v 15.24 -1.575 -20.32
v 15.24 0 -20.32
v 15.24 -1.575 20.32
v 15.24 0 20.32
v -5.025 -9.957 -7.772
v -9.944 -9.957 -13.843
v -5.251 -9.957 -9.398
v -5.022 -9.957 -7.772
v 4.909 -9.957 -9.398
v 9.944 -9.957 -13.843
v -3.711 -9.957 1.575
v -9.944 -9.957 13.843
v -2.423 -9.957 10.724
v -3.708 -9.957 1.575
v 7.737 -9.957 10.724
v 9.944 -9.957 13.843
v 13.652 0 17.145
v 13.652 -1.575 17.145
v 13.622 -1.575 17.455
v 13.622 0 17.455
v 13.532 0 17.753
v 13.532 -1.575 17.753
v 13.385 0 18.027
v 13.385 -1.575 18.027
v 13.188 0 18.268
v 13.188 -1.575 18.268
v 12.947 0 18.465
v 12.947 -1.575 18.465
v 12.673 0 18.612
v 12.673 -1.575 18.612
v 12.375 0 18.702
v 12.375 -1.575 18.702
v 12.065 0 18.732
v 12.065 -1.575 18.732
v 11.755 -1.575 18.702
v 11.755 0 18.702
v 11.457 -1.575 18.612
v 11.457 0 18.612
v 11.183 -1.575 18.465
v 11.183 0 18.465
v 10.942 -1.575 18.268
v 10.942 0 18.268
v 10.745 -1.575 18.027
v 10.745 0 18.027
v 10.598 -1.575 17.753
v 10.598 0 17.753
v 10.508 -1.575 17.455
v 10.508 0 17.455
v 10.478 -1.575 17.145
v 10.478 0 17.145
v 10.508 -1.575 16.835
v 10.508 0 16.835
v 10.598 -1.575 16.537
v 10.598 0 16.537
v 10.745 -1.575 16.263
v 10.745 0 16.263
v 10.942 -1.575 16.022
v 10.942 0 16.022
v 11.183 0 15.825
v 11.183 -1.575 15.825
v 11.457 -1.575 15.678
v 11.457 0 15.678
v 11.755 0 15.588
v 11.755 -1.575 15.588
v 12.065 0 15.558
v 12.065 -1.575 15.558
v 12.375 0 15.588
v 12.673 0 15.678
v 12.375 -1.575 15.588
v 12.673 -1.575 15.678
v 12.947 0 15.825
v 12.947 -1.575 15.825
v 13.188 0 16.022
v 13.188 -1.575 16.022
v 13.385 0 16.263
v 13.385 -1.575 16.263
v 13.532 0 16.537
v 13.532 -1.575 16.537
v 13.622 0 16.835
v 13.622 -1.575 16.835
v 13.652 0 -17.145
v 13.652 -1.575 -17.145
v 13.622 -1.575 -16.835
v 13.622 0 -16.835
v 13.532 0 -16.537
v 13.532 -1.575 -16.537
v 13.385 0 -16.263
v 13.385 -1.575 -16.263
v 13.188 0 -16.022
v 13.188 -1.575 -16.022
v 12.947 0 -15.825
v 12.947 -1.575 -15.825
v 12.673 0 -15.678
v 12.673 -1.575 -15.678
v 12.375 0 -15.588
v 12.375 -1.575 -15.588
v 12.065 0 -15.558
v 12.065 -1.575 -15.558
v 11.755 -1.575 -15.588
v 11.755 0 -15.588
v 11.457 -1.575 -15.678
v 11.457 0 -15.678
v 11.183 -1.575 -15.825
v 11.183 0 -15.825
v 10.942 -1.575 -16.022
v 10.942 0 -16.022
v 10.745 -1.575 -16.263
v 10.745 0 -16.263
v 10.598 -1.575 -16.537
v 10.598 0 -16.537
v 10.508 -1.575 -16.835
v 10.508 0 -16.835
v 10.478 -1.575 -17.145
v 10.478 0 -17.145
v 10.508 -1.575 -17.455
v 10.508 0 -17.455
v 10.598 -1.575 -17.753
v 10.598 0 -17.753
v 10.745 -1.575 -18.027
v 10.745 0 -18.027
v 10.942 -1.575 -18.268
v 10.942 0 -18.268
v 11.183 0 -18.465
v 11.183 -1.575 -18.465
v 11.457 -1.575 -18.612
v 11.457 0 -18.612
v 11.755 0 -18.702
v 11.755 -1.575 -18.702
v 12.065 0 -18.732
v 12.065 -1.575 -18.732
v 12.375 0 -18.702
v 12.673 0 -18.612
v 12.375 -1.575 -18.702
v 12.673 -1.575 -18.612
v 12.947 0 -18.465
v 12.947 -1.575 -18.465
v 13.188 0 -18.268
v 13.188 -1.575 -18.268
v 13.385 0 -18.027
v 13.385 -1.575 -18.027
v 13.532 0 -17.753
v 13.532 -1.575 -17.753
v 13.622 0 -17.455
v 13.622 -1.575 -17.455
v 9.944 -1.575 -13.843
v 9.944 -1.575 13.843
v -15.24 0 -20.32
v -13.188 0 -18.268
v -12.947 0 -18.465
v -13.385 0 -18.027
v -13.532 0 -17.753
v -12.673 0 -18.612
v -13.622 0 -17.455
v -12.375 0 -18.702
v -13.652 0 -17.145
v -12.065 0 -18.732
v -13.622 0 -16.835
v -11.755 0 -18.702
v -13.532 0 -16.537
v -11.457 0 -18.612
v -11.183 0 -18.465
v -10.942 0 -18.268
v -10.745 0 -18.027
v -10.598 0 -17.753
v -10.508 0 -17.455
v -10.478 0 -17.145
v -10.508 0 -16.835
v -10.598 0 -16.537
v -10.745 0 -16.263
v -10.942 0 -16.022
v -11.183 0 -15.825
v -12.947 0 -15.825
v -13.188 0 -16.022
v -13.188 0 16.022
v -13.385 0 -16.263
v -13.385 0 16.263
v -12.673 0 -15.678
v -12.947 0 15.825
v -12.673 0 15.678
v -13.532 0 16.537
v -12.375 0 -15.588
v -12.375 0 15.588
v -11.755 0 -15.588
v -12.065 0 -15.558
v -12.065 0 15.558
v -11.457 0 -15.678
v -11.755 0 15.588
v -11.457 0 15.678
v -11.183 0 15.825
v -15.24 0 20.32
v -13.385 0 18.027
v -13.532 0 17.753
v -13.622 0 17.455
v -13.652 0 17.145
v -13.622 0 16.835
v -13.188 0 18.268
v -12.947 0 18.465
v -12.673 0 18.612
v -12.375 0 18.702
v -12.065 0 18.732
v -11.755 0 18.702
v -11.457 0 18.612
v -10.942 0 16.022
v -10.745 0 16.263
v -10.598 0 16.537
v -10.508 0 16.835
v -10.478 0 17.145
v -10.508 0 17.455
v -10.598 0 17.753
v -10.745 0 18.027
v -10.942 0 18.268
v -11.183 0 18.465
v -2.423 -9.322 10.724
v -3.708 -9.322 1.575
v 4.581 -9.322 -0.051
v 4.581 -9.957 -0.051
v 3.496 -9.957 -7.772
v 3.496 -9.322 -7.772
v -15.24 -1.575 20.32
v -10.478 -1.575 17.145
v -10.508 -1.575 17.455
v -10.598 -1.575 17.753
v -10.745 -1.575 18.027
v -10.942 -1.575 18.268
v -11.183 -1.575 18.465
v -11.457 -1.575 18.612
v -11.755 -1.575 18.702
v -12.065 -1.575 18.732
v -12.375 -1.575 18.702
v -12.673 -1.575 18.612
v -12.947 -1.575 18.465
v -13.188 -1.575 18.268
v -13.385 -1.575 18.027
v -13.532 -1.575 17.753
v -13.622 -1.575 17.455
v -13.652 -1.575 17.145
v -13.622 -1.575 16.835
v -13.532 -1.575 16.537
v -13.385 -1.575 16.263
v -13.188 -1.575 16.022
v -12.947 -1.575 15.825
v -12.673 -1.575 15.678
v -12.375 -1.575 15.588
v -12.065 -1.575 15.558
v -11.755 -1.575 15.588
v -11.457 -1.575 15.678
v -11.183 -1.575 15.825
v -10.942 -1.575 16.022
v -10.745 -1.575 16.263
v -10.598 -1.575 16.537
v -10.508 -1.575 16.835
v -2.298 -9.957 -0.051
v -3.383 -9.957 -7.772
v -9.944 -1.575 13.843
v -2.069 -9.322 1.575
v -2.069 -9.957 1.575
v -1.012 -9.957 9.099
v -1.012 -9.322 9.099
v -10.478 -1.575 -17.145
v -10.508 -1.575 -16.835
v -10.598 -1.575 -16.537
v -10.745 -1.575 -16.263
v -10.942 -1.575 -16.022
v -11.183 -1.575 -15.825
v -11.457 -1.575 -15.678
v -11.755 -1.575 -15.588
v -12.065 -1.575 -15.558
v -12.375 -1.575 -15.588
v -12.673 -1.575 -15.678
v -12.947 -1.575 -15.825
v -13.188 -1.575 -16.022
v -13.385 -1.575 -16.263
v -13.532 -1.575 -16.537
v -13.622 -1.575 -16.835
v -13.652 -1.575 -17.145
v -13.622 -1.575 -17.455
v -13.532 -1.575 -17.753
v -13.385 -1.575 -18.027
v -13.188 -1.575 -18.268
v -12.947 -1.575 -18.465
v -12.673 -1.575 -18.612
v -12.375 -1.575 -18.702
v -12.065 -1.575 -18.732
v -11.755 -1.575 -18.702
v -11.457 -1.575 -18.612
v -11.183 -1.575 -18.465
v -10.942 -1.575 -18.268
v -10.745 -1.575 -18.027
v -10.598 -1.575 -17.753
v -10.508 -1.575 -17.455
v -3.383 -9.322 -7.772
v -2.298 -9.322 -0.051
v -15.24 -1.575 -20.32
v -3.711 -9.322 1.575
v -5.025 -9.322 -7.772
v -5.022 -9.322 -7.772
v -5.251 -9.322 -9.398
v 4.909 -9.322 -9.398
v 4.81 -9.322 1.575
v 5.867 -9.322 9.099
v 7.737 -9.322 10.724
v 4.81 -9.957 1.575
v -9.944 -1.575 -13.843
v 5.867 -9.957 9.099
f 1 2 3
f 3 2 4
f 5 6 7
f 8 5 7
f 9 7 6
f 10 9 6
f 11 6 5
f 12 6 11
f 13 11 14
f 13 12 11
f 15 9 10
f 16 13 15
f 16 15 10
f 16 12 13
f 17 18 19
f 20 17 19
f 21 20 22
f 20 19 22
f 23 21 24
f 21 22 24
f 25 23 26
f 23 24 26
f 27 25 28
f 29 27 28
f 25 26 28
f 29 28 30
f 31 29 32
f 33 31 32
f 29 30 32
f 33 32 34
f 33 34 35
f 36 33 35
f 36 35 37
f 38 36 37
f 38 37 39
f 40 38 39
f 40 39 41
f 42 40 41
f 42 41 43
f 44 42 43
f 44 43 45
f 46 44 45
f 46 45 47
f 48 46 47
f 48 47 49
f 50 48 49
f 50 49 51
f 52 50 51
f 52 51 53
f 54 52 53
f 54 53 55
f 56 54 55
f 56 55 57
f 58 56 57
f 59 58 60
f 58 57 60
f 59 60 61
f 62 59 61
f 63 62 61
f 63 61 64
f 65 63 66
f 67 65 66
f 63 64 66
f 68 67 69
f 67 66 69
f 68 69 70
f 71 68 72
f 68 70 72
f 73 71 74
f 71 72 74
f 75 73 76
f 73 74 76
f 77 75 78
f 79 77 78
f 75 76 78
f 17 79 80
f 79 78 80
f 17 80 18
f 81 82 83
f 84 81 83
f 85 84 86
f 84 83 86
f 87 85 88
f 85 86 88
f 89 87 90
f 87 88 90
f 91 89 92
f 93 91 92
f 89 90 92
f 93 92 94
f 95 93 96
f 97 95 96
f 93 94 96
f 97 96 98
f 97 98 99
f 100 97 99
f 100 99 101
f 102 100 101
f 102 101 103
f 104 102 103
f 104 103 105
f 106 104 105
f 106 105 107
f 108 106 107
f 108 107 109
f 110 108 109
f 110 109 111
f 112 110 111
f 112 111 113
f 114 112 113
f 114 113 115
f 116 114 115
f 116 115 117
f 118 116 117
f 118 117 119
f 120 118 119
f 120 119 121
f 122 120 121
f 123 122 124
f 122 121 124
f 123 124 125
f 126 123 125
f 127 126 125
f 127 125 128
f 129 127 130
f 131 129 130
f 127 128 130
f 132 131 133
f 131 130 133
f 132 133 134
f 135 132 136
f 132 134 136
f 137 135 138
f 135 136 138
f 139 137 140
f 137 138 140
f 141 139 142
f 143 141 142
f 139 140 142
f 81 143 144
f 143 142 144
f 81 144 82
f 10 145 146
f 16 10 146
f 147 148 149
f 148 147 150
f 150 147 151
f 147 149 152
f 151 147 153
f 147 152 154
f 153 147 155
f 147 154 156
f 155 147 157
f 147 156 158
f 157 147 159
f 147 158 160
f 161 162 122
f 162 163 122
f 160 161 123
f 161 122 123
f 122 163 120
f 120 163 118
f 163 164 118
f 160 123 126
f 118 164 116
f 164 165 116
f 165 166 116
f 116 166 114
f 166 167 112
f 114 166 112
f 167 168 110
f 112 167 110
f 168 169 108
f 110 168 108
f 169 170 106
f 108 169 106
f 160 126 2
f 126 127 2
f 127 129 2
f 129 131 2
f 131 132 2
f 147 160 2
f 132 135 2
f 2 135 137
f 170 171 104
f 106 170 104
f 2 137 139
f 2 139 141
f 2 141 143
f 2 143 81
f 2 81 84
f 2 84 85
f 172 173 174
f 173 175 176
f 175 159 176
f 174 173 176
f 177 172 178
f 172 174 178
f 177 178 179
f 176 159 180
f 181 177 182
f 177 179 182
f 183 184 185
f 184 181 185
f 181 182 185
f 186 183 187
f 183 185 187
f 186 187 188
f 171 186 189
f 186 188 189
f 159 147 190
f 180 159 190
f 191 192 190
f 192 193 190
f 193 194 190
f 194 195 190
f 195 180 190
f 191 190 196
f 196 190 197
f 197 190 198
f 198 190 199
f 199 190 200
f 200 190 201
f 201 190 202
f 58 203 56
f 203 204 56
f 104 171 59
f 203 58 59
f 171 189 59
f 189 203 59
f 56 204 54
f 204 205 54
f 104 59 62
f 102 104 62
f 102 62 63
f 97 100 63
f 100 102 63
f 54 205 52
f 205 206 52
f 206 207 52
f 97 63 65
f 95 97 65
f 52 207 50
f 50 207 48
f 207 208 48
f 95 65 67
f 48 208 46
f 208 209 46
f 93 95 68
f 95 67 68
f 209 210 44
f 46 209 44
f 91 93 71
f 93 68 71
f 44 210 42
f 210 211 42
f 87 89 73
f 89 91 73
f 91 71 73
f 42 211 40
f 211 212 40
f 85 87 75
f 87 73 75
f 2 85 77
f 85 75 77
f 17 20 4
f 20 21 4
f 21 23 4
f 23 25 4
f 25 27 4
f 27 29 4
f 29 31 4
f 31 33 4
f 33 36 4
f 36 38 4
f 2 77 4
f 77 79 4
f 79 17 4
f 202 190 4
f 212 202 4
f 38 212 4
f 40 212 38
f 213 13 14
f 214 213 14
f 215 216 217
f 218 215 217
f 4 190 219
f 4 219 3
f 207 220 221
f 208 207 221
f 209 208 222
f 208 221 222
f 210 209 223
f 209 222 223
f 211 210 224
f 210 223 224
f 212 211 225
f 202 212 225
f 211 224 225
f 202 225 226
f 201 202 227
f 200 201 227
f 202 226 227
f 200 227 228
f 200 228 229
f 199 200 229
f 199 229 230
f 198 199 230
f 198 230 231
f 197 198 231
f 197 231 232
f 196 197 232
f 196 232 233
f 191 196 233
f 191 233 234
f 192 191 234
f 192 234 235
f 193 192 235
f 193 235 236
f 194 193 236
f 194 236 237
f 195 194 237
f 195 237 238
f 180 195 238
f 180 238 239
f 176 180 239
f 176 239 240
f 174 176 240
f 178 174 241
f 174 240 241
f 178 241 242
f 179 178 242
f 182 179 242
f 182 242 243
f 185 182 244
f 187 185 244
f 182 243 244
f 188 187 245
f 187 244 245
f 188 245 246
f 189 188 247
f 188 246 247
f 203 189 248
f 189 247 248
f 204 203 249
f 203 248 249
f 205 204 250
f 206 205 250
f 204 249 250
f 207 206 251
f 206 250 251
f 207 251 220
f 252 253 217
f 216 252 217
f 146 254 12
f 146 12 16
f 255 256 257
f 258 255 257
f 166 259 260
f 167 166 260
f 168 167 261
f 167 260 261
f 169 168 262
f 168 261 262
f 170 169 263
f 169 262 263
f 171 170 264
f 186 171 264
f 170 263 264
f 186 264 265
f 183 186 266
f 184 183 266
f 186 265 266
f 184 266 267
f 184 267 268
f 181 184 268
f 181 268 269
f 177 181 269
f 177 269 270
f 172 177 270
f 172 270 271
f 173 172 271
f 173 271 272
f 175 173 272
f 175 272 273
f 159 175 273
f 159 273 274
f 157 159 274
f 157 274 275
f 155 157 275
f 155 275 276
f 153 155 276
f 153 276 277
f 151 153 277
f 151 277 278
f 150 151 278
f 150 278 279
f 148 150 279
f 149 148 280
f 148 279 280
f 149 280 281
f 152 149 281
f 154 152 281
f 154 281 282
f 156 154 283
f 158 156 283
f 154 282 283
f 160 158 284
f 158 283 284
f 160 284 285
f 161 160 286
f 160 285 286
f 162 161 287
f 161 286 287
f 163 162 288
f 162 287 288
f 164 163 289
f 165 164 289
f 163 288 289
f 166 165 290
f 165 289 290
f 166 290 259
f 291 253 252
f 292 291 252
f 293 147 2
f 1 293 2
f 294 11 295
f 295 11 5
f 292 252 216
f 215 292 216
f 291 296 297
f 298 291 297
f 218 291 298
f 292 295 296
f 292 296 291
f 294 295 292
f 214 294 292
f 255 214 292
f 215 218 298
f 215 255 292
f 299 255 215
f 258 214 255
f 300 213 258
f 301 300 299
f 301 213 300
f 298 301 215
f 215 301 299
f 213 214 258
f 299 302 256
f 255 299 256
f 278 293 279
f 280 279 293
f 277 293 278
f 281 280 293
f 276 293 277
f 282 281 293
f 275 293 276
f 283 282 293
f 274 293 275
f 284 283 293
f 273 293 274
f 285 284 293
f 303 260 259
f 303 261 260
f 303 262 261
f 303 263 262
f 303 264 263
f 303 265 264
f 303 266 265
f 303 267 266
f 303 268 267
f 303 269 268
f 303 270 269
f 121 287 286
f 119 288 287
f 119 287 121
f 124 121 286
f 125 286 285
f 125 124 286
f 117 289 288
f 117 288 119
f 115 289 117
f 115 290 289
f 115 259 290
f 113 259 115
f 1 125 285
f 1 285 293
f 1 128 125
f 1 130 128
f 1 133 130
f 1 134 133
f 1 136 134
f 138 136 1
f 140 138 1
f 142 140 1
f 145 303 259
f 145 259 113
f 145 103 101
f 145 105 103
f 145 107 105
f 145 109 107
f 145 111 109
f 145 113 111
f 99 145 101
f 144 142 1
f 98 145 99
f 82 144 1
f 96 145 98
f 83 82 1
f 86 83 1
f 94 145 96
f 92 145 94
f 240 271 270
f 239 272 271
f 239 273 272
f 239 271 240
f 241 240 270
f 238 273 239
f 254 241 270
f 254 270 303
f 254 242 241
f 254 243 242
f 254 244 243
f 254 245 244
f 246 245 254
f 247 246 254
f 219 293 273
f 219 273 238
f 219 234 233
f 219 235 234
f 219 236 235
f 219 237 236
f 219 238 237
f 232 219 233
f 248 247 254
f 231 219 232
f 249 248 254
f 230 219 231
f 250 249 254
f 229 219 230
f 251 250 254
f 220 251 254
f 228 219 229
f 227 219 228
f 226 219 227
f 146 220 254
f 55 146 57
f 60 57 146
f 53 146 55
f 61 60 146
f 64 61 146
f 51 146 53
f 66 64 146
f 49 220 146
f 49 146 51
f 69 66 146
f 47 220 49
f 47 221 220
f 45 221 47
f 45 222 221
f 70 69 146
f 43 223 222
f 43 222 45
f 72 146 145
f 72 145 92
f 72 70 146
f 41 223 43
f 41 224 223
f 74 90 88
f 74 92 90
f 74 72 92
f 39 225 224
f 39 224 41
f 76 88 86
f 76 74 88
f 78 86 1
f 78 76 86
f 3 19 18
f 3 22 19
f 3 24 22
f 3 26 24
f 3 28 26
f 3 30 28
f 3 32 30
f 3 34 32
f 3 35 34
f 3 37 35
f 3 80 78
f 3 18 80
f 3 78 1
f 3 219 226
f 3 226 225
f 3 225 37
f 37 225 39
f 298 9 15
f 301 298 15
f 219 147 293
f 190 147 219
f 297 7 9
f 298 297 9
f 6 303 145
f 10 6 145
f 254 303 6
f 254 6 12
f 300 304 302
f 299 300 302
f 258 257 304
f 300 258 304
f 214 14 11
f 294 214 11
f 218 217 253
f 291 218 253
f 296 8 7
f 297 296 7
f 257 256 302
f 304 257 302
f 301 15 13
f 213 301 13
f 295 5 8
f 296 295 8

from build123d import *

# Parameters (mm, degrees)
F0_W     = 30.48
F0_H     = 40.64
F1_DEPTH = 1.5748
F2_R     = 1.5875
F3_DEPTH = 1.5758
F4_W     = 19.8882
F4_H     = 27.686
F5_DEPTH = 8.382
F7_DEPTH = 0.635


with BuildPart() as f1:
    # F0 (on Front) → F1 (new body)
    with BuildSketch(Plane.XZ):
        Rectangle(F0_W, F0_H)
    extrude(amount=F1_DEPTH)

    # F2 (on face) → F3 (cut, through all)
    with BuildSketch(Plane.XZ.offset(1.5748)):
        with Locations((-12.065, 17.145)):
            Circle(F2_R)
        with Locations((12.065, 17.145)):
            Circle(F2_R)
        with Locations((-12.065, -17.145)):
            Circle(F2_R)
        with Locations((12.065, -17.145)):
            Circle(F2_R)
    extrude(amount=-F3_DEPTH, mode=Mode.SUBTRACT)

    # F4 (on face) → F5 (join)
    with BuildSketch(Plane.XZ.offset(1.5748)):
        Rectangle(F4_W, F4_H)
    extrude(amount=F5_DEPTH)

    # F6 (on face) → F7 (cut)
    with BuildSketch(Plane.XZ.offset(9.9568)):
        Polygon((-5.022132, -7.7724), (-5.250595, -9.398), (4.909405, -9.398), (7.737403, 10.724247), (-2.422597, 10.724247), (-3.708468, 1.5748), align=None)
        Polygon((-2.297791, -0.0508), (1.2573, -0.0508), (4.581493, -0.0508), (3.496293, -7.7724), (-3.382992, -7.7724), align=None, mode=Mode.SUBTRACT)
        Polygon((4.809956, 1.5748), (1.2573, 1.5748), (-2.069328, 1.5748), (-1.011921, 9.098647), (5.867364, 9.098647), align=None, mode=Mode.SUBTRACT)
        Polygon((-5.024567, -7.7724), (-5.022132, -7.7724), (-3.708468, 1.5748), (-3.710904, 1.5748), align=None)
    extrude(amount=-F7_DEPTH, mode=Mode.SUBTRACT)


solid = f1.part
